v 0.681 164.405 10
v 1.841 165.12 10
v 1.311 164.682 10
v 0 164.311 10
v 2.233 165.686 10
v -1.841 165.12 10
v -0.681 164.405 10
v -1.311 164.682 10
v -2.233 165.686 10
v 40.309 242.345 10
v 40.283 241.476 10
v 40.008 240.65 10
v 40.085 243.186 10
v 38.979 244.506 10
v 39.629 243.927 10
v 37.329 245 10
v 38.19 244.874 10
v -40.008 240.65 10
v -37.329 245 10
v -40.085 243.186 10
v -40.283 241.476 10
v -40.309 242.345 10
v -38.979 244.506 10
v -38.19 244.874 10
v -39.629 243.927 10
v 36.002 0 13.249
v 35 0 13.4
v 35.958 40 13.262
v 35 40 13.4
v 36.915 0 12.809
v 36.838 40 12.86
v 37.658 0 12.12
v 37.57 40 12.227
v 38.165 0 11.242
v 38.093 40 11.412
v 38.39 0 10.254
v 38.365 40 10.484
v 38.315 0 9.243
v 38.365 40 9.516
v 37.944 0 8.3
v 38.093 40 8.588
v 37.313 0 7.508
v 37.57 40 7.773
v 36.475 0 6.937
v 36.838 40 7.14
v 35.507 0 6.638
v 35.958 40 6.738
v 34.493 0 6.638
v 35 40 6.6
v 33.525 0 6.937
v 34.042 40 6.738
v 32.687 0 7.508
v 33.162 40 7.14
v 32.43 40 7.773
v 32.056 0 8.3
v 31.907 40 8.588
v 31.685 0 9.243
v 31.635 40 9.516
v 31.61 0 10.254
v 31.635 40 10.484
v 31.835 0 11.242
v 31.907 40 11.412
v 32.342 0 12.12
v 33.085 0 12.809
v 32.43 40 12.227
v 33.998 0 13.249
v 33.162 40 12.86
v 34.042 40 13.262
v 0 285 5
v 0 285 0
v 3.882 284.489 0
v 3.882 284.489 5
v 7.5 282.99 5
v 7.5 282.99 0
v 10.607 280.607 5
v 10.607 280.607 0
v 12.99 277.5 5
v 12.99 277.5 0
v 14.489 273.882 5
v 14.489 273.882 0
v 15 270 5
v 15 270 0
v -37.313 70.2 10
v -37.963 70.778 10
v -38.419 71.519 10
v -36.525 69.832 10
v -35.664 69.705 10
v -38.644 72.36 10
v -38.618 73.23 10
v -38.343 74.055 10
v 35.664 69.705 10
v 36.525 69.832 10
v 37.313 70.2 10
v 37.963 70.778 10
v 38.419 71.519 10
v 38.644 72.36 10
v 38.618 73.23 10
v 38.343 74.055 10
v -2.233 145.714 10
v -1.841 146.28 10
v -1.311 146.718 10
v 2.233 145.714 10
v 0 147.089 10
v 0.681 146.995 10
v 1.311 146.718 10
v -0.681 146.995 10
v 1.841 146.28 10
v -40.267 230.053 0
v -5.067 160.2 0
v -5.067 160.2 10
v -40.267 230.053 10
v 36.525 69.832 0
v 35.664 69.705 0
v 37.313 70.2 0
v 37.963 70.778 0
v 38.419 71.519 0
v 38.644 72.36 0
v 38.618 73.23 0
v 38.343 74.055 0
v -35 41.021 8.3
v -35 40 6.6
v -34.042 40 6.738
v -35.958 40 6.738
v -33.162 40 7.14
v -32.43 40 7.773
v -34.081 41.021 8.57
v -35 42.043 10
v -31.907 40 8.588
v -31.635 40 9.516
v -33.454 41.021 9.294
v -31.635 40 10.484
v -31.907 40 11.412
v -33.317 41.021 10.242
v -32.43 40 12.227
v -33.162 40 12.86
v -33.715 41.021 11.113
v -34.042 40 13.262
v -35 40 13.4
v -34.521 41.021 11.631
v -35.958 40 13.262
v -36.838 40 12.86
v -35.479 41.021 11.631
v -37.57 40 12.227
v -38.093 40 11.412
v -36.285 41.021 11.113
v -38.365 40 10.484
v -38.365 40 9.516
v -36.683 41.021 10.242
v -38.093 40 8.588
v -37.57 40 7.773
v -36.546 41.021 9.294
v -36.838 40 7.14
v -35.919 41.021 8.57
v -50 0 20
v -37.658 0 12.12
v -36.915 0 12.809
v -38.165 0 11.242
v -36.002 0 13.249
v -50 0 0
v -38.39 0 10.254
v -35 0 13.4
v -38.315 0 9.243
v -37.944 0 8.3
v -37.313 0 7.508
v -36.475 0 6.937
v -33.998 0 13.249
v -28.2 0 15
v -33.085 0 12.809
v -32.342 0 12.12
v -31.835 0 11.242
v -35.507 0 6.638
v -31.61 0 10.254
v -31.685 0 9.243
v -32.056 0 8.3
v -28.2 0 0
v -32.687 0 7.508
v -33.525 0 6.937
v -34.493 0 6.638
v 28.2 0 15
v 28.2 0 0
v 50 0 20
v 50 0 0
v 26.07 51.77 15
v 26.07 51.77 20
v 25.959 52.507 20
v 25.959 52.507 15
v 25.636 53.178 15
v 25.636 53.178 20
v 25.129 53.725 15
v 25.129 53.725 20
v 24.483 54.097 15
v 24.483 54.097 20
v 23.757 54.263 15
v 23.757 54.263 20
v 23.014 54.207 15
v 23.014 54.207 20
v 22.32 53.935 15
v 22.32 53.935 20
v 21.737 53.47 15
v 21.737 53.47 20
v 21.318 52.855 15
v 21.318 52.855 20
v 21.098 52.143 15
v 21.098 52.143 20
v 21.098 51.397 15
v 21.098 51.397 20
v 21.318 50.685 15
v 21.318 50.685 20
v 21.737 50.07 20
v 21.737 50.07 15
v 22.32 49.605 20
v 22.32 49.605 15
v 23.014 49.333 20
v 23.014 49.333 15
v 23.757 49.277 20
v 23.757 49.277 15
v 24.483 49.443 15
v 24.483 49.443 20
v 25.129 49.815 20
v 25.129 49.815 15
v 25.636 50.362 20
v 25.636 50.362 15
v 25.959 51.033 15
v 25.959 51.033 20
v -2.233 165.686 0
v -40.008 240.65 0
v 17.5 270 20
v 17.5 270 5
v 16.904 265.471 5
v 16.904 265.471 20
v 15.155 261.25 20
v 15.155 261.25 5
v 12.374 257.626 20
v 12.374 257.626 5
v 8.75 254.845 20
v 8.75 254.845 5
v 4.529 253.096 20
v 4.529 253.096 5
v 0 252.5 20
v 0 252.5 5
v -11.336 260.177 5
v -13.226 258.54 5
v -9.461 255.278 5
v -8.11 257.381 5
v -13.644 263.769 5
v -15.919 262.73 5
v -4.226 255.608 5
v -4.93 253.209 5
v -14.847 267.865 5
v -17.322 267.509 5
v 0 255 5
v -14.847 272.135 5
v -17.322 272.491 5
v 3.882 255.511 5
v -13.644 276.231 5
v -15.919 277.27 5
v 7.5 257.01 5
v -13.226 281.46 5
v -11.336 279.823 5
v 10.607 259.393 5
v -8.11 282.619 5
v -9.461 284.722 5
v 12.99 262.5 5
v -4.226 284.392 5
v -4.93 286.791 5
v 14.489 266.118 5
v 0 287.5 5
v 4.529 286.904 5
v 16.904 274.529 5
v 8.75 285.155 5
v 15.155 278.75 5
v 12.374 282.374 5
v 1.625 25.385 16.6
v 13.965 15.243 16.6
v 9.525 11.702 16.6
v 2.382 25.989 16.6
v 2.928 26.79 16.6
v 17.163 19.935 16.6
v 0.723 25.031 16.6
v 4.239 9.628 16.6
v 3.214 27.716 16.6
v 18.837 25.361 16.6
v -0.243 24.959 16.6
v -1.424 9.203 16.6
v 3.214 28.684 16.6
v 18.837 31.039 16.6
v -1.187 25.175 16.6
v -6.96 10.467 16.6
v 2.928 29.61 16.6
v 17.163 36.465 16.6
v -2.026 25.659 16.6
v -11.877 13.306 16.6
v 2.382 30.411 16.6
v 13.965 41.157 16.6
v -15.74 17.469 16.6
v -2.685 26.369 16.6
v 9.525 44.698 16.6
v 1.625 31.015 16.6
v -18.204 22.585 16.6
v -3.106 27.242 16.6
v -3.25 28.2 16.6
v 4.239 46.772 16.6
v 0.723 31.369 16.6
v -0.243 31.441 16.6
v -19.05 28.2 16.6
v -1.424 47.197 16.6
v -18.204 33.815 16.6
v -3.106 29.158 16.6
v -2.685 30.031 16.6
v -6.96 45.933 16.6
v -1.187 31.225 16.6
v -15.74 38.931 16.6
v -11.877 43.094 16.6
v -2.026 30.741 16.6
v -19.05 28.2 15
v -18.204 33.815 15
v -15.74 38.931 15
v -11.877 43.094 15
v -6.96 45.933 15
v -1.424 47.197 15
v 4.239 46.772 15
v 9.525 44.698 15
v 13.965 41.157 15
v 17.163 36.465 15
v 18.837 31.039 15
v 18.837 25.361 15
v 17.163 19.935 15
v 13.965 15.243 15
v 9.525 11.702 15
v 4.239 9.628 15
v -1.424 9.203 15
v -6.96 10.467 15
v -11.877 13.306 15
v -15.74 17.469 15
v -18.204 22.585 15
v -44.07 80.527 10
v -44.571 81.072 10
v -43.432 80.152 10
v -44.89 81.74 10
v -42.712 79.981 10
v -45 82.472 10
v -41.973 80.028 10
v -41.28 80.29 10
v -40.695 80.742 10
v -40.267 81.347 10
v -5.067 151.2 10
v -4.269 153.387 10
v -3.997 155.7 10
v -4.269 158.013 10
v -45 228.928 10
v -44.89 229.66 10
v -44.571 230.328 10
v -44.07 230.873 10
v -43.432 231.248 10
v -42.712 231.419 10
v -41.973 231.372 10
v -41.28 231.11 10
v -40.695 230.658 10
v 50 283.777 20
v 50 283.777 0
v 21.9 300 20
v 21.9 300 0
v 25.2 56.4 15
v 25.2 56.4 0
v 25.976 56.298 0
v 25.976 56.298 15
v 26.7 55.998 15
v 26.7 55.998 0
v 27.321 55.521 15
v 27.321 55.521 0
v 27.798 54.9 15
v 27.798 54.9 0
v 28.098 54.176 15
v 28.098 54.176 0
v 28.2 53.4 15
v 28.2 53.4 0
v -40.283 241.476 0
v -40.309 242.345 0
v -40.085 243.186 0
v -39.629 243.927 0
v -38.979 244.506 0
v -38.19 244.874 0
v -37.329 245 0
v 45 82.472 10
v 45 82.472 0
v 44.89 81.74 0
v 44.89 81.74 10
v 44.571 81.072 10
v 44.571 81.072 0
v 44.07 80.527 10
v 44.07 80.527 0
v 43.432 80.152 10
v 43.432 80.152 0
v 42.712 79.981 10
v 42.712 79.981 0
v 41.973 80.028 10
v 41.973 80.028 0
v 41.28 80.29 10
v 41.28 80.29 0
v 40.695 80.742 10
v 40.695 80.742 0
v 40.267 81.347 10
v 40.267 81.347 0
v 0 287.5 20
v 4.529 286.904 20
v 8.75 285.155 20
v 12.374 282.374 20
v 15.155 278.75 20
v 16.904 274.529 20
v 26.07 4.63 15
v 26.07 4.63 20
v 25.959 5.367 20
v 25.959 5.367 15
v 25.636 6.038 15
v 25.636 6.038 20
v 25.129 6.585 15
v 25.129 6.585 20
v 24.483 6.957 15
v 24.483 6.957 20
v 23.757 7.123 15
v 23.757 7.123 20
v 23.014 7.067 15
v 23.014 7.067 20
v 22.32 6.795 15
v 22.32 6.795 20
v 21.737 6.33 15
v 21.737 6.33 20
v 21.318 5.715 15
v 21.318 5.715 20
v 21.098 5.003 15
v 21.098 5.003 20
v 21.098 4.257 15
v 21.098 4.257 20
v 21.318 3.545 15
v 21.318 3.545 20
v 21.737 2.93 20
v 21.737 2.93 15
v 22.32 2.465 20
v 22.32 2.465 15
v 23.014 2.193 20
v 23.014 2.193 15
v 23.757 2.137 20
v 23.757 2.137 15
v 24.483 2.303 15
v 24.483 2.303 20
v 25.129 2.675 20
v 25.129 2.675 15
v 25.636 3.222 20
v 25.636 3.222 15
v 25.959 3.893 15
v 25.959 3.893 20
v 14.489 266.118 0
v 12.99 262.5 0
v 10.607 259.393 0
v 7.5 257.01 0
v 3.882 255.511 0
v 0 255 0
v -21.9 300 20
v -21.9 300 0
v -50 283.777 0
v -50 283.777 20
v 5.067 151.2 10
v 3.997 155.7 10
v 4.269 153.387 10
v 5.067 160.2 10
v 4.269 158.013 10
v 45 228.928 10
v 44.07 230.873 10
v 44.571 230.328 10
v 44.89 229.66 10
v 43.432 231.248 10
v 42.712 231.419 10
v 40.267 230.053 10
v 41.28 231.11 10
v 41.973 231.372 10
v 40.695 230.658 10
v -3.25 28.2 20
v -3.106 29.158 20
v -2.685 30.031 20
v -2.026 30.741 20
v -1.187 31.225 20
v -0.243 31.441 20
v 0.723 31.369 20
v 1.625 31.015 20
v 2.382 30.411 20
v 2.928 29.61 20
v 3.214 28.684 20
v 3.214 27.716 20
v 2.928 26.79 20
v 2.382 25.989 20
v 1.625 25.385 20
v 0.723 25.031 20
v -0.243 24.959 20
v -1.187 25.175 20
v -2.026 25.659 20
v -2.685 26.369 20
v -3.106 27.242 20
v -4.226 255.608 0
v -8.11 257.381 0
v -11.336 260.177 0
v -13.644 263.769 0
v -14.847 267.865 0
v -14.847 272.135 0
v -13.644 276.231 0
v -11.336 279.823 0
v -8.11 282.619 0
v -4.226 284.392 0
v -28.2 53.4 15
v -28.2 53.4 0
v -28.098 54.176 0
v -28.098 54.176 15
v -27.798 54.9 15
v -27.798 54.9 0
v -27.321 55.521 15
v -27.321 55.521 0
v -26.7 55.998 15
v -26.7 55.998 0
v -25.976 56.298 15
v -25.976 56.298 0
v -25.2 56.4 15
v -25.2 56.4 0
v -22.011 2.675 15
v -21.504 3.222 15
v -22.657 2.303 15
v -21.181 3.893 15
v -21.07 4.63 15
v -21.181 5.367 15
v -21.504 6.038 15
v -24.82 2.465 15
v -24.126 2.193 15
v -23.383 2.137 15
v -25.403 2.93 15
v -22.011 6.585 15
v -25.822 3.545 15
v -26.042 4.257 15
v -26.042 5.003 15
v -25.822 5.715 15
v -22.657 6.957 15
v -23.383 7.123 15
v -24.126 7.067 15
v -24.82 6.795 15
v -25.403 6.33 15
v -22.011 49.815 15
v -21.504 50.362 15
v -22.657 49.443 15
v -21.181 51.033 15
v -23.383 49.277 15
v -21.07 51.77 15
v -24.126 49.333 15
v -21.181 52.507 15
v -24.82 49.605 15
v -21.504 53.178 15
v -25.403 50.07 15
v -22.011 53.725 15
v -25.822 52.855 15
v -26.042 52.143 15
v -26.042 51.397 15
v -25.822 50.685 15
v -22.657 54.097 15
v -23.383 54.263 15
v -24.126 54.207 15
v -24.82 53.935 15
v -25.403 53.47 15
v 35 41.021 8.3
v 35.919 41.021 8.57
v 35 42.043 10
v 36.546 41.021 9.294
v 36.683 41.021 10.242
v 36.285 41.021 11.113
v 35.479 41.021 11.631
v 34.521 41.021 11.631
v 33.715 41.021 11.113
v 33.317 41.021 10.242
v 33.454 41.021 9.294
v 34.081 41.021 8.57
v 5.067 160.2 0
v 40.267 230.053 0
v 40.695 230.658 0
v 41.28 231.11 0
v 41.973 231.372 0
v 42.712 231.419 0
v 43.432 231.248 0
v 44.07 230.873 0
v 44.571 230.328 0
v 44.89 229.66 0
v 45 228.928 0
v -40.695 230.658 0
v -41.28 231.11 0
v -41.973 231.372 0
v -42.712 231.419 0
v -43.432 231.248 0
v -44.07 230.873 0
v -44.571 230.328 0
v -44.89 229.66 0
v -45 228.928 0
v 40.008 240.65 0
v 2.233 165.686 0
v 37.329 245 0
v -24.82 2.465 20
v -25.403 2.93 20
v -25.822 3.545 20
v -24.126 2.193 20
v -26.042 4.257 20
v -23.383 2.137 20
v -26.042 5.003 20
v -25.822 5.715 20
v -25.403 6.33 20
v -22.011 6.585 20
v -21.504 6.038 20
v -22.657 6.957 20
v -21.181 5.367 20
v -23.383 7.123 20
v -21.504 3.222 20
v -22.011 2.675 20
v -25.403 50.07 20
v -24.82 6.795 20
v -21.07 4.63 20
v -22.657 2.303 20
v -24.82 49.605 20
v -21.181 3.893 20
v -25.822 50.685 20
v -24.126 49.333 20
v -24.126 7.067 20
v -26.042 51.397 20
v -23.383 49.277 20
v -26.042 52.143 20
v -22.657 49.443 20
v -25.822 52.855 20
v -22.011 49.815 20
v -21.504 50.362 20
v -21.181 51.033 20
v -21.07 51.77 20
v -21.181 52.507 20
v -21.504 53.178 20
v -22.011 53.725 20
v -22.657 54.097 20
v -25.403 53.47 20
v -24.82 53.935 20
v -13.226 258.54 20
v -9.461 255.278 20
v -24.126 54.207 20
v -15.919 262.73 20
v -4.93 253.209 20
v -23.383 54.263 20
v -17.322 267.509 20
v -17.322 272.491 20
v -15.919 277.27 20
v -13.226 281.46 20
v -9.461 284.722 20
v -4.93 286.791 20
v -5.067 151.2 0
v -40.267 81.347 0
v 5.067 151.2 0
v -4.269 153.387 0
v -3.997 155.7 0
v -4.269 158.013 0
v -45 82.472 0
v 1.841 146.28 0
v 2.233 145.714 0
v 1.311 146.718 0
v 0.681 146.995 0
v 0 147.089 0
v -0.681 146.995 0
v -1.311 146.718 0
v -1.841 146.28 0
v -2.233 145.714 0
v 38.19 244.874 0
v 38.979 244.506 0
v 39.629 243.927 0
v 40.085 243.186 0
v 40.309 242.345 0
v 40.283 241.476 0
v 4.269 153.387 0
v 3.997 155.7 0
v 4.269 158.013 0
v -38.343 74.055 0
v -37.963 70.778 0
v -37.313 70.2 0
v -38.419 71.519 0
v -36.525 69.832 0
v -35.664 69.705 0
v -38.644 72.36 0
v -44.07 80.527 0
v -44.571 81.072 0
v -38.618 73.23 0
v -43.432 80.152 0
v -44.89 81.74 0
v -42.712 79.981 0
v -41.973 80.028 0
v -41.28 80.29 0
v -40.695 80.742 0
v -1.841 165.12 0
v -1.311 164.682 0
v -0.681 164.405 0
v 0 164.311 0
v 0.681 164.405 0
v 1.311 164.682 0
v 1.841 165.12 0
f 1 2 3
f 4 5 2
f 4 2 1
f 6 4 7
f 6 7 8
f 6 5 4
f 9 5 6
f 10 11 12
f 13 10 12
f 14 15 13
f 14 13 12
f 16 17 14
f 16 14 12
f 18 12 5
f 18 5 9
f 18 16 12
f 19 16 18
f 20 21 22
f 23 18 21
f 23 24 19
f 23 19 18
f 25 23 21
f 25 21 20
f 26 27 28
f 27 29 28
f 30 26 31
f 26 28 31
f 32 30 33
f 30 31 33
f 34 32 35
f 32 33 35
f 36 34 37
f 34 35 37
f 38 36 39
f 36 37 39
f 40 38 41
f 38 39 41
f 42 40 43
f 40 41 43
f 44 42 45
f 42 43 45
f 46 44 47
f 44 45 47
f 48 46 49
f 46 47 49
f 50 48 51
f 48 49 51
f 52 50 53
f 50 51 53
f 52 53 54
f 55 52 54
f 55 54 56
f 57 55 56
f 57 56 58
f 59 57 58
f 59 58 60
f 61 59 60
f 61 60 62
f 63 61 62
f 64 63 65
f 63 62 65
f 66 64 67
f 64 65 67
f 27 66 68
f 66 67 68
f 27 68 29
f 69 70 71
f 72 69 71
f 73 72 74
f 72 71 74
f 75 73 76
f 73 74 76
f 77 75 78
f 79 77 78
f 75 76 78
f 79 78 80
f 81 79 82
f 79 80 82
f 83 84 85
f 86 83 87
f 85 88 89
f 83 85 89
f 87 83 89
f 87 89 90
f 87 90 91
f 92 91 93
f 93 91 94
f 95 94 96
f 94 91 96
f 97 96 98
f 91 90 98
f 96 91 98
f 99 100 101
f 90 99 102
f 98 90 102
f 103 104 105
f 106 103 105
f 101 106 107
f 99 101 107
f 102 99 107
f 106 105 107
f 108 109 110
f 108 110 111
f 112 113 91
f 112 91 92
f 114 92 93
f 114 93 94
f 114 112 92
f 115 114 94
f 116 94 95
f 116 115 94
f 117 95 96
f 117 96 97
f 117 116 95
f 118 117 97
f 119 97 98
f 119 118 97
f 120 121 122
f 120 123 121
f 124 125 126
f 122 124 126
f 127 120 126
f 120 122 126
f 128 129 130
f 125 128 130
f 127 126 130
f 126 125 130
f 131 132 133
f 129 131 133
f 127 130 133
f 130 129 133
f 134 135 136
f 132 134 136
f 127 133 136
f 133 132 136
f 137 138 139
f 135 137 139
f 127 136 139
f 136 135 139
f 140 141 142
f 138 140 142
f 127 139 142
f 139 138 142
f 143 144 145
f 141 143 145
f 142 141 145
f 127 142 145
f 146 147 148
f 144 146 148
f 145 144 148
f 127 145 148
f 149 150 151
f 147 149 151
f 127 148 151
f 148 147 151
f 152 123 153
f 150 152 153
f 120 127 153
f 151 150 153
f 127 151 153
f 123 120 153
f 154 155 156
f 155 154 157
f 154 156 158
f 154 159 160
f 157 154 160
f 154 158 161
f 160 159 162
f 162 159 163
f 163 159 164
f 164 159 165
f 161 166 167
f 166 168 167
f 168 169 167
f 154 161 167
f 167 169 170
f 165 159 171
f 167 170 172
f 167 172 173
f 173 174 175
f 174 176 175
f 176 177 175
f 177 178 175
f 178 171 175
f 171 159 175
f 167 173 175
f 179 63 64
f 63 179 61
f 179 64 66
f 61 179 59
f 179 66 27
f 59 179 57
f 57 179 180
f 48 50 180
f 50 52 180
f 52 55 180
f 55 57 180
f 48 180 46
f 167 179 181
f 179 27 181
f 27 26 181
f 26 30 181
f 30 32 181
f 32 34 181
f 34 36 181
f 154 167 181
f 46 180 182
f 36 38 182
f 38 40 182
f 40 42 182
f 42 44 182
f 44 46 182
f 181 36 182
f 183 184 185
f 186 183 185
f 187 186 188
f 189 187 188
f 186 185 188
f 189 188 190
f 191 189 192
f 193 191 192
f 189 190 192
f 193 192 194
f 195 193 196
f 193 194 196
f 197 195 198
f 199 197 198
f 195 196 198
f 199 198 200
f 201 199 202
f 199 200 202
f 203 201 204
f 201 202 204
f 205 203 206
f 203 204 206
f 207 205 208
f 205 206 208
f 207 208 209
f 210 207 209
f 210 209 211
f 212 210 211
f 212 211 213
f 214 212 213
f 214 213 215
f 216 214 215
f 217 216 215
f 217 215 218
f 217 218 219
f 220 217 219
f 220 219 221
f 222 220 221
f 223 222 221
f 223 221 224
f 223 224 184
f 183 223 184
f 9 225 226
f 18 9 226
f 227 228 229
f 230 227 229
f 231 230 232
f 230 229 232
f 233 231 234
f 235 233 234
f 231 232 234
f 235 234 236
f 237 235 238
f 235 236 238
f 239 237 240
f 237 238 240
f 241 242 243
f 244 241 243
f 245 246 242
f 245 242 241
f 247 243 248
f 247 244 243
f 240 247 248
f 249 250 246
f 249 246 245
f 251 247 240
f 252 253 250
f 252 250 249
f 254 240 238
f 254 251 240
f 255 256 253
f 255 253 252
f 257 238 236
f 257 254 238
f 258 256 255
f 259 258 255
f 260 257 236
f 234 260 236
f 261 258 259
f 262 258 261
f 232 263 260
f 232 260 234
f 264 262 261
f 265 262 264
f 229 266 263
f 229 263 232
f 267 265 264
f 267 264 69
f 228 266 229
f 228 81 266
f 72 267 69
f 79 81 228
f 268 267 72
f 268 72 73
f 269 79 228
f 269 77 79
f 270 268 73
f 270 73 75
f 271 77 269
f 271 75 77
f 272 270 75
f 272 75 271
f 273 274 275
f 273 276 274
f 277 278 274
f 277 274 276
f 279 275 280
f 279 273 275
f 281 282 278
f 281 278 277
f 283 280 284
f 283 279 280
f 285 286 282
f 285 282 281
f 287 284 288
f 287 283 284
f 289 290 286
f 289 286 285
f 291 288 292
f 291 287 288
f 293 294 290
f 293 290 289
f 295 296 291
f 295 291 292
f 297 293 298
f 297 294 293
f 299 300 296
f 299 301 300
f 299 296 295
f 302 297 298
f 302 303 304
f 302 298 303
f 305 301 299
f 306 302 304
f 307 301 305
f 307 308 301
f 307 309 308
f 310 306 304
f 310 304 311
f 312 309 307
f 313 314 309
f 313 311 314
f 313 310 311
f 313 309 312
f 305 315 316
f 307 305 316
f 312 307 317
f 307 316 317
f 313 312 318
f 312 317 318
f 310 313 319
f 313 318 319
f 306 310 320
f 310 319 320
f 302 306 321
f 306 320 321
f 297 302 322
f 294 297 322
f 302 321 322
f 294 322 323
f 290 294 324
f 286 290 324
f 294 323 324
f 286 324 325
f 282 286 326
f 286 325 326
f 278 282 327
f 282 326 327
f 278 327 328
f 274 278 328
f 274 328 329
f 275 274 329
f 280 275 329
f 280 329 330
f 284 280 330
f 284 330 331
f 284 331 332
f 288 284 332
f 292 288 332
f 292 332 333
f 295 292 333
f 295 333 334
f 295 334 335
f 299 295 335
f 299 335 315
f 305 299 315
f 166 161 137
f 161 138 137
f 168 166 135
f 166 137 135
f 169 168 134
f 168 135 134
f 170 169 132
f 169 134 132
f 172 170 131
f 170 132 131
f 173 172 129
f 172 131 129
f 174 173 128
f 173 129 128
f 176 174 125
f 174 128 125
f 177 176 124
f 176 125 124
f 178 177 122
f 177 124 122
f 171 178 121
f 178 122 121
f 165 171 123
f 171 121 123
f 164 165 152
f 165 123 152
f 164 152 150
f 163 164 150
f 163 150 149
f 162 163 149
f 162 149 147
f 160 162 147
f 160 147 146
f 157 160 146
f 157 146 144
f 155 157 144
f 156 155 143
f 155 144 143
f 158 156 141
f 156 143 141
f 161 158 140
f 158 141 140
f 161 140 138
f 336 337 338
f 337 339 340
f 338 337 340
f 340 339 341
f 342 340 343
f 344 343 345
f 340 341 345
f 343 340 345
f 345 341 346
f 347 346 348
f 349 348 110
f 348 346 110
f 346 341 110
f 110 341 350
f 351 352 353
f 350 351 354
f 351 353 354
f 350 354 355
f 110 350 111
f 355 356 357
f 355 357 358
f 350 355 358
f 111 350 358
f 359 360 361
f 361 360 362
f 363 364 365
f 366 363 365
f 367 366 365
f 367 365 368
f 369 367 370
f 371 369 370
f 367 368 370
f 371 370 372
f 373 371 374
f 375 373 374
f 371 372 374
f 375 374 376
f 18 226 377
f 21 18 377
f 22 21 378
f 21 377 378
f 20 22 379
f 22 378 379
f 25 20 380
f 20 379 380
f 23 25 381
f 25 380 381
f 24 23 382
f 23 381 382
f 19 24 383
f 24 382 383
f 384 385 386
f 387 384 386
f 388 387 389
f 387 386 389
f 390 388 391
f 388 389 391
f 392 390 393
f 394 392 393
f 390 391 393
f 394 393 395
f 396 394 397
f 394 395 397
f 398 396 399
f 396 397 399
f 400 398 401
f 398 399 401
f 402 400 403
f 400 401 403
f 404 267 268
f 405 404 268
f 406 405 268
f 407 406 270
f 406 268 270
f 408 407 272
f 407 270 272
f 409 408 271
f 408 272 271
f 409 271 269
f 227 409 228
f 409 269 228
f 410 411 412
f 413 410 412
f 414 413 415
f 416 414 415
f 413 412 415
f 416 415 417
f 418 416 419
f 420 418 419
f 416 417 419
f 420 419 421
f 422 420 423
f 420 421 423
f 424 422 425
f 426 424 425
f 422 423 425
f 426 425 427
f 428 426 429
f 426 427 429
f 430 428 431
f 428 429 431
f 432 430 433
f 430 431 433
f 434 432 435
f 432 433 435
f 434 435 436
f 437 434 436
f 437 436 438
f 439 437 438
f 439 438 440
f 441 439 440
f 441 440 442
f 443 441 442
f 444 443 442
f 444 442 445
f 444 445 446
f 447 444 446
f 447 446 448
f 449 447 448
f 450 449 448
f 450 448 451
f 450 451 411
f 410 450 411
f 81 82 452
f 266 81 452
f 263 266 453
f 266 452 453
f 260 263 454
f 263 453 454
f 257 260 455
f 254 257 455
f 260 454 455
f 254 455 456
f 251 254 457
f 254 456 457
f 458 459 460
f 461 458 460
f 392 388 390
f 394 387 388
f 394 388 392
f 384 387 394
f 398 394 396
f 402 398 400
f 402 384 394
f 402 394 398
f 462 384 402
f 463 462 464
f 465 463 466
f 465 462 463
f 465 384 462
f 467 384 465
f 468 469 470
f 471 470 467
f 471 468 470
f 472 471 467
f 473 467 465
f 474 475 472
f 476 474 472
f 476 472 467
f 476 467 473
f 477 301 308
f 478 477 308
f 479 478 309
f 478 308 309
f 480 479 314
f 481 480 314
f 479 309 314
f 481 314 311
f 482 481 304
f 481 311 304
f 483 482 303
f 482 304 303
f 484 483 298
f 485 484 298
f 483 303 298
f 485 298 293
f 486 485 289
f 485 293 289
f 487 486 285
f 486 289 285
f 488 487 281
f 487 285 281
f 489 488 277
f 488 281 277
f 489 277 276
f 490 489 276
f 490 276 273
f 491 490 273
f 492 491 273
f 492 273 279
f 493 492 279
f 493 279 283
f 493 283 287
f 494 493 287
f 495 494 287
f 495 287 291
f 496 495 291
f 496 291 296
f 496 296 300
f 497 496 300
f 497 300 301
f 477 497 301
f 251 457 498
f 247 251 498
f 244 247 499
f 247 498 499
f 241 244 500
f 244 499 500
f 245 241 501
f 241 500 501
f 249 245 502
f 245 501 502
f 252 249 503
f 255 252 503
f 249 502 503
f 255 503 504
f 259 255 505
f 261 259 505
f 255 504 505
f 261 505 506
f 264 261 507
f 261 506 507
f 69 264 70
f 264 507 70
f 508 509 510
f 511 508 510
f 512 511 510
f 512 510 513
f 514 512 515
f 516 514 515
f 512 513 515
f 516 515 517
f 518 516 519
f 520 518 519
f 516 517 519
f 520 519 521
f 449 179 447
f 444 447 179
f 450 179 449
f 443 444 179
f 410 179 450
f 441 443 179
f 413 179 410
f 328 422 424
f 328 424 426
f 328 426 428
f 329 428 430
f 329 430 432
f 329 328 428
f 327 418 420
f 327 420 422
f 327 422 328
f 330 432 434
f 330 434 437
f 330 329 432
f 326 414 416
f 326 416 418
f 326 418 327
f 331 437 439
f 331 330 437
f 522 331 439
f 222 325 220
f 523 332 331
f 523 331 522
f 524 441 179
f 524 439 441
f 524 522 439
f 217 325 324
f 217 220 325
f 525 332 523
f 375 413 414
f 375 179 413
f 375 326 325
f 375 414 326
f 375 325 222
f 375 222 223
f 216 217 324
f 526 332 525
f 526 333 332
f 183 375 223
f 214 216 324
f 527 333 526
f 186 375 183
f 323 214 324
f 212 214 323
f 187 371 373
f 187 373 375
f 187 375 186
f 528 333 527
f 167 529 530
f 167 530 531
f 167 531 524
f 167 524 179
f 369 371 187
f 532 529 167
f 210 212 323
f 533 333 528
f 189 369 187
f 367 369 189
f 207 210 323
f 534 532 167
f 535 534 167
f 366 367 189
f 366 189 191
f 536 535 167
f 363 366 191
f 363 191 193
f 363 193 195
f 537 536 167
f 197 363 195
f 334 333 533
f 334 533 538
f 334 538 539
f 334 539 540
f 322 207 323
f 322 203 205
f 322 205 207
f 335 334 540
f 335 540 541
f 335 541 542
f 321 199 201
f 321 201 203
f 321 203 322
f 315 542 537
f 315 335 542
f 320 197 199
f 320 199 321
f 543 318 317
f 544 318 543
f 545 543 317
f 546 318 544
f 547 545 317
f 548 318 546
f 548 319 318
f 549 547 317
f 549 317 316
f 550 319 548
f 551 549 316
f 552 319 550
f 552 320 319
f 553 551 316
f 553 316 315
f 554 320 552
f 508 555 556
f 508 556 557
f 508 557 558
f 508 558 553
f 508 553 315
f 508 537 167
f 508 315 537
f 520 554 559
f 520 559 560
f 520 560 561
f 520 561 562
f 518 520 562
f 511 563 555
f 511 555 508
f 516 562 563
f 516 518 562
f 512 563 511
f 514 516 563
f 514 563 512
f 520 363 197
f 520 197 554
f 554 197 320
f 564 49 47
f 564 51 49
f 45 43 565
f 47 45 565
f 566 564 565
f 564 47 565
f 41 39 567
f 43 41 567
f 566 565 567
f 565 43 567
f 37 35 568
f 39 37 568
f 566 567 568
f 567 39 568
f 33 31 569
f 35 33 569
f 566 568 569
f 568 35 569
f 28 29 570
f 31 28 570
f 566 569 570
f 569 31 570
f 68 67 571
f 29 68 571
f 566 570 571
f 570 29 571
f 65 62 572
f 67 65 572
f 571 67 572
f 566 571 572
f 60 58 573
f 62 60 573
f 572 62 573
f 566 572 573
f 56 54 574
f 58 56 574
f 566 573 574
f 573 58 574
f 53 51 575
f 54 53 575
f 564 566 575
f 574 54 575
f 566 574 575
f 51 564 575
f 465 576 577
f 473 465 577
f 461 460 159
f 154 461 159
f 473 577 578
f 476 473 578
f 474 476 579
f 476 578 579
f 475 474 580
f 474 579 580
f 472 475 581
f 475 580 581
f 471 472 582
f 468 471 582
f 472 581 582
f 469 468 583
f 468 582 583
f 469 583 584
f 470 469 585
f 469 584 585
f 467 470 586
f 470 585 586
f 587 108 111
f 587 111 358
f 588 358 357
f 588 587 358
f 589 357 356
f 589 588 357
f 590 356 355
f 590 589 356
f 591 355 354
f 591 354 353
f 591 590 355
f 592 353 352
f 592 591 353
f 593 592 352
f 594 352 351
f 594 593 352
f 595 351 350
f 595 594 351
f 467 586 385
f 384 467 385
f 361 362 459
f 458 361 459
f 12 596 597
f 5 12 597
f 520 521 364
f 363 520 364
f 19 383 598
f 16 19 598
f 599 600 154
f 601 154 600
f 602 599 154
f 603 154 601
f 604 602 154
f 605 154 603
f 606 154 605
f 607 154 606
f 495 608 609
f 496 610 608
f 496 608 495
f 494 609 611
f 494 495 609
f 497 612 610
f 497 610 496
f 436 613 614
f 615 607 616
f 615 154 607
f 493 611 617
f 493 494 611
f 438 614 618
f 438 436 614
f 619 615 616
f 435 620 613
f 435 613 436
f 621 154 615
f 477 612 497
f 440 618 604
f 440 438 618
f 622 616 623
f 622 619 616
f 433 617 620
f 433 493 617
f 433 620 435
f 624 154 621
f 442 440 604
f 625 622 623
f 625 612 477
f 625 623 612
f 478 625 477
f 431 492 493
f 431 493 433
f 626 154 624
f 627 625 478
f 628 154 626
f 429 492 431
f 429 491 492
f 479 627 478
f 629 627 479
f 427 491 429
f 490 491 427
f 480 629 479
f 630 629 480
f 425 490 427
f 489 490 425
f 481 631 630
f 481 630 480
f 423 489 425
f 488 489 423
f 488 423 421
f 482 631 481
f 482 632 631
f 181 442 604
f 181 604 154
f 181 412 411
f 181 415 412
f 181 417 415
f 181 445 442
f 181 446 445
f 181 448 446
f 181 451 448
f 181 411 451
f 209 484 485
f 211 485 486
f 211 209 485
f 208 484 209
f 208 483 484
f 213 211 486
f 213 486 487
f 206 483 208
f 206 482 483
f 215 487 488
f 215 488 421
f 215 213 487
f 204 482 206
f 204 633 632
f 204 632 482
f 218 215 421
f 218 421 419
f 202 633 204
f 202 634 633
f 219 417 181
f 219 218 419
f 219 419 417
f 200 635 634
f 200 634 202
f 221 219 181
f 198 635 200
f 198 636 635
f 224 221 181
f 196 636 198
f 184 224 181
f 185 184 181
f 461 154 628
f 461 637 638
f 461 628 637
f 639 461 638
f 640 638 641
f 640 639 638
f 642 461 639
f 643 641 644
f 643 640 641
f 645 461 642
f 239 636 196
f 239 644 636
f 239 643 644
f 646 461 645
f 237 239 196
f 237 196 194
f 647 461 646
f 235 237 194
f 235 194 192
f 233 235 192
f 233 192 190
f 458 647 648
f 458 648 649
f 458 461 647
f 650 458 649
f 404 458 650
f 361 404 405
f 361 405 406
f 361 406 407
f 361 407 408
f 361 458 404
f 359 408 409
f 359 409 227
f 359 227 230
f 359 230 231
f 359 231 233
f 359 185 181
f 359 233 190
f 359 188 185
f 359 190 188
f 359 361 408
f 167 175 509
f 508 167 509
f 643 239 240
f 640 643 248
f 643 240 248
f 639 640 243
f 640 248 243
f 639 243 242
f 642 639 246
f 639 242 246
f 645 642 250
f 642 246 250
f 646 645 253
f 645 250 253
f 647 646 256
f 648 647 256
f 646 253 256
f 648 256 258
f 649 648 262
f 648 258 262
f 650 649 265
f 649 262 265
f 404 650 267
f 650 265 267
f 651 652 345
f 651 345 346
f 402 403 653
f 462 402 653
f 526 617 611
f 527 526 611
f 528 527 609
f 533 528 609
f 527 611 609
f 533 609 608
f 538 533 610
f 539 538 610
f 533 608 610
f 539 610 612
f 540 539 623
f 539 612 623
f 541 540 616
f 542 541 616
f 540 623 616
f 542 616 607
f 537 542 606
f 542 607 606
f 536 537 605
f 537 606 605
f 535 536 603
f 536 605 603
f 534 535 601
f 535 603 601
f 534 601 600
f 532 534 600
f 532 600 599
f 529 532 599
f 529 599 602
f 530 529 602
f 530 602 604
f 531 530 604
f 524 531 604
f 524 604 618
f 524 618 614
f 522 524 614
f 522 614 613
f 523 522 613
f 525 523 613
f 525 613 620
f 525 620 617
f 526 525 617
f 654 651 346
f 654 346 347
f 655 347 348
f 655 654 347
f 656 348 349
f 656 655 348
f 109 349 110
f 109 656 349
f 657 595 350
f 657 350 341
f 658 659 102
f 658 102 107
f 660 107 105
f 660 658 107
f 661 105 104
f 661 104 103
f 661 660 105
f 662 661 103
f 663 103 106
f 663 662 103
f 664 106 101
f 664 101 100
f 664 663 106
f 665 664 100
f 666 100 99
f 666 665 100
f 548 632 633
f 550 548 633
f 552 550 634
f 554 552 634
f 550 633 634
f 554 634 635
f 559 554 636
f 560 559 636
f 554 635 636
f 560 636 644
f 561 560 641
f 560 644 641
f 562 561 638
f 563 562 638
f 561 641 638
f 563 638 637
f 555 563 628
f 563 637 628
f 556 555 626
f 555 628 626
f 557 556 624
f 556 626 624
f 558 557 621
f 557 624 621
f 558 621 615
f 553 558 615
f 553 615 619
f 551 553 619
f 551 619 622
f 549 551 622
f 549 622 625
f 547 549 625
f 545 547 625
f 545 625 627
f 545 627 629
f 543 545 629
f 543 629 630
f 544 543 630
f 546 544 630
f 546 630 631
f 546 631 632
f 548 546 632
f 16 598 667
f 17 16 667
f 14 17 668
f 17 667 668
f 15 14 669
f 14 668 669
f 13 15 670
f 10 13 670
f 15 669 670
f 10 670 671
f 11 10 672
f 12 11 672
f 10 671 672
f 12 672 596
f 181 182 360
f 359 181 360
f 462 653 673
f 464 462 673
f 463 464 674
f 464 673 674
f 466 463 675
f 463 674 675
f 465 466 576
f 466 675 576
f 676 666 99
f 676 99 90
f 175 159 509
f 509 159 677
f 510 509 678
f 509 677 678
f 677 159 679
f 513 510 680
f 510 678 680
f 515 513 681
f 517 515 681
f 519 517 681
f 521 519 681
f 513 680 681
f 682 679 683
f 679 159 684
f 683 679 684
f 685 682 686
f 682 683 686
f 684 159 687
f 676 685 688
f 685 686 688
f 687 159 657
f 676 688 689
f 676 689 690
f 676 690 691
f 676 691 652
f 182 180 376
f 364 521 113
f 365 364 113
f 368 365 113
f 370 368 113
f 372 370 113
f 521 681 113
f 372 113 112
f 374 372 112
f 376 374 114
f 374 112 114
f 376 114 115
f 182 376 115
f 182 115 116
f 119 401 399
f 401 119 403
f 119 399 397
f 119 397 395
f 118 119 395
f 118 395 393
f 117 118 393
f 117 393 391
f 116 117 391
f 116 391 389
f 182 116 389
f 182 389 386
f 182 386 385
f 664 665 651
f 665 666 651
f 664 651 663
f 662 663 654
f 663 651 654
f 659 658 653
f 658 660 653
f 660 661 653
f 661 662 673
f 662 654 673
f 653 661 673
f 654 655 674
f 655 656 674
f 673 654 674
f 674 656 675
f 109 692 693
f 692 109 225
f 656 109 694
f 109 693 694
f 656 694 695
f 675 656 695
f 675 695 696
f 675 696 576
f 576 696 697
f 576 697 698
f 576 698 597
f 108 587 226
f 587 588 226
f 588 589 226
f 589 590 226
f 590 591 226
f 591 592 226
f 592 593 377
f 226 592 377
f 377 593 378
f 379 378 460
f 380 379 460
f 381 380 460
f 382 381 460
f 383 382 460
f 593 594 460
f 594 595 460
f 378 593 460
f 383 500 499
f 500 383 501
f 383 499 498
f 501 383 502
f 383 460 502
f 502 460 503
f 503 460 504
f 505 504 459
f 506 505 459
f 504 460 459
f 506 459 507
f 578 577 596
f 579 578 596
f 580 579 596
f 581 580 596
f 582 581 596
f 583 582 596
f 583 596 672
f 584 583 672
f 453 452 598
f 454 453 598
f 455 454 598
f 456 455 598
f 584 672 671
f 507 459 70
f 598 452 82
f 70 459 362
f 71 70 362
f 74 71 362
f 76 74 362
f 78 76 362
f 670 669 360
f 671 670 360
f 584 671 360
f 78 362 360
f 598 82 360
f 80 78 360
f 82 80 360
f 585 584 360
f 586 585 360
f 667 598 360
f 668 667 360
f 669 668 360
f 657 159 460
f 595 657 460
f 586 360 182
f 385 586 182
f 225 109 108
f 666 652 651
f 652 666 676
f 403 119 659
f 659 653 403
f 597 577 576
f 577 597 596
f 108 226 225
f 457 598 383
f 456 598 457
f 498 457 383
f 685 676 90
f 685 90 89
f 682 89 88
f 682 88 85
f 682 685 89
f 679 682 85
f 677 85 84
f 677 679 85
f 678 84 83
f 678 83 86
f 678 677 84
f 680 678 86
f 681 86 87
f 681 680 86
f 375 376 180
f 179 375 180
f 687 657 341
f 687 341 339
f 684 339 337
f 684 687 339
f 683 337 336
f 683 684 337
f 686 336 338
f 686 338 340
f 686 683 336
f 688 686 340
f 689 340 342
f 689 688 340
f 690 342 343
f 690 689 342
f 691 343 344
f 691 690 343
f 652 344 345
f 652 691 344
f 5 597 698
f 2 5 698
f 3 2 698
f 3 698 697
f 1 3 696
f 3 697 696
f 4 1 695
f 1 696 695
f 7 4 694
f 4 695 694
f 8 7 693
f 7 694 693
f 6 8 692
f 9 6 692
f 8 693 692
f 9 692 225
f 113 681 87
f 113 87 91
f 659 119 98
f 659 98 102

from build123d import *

# Parameters (mm, degrees)
SZKIC1_R                    = 17.5
DODANIE_WYCI_GNI_CIE1_DEPTH = 20
SZKIC1_3_R                  = 17.5
SZKIC1_3_R_2                = 15
DODANIE_WYCI_GNI_CIE2_DEPTH = 5
OTW_R_GWINTOWANY_M81_D      = 6.8
OTW_R_GWINTOWANY_M81_DEPTH  = 40
OTW_R_GWINTOWANY_M81_TIP    = 2.042926105
SZKIC4_R                    = 3.25
WYTNIJ_WYCI_GNI_CIE2_DEPTH  = 15
SZKIC4_4_R                  = 19.05
SZKIC4_4_R_2                = 3.25
WYTNIJ_WYCI_GNI_CIE3_DEPTH  = 16.6
SZKIC4_5_R                  = 3.25
WYTNIJ_WYCI_GNI_CIE4_DEPTH  = 49.6
WYTNIJ_WYCI_GNI_CIE6_DEPTH  = 10
OTW_R_GWINTOWANY_M61_D      = 5


with BuildPart() as part:
    # Szkic1 → Dodanie-wyciągnięcie1 (new body)
    with BuildSketch(Plane.XY):
        Polygon((-50, 0), (50, 0), (50, 283.776622614), (21.900286098, 300), (-21.900286098, 300), (-50, 283.776622614), align=None)
        with Locations((0, 270)):
            Circle(SZKIC1_R, mode=Mode.SUBTRACT)
    extrude(amount=DODANIE_WYCI_GNI_CIE1_DEPTH)

    # Szkic1<3> → Dodanie-wyciągnięcie2 (add)
    with BuildSketch(Plane.XY):
        with Locations((0, 270)):
            Circle(SZKIC1_3_R)
        with Locations((0, 270)):
            Circle(SZKIC1_3_R_2, mode=Mode.SUBTRACT)
    extrude(amount=DODANIE_WYCI_GNI_CIE2_DEPTH)

    # Otwór gwintowany M81
    with Locations(Plane(origin=(-35, 0, 10), x_dir=(0, 0, -1), z_dir=(0, -1, 0))):
        with Locations((0, 0), (0, 70)):
            Hole(OTW_R_GWINTOWANY_M81_D / 2, depth=OTW_R_GWINTOWANY_M81_DEPTH)
            with Locations((0, 0, -(OTW_R_GWINTOWANY_M81_DEPTH + OTW_R_GWINTOWANY_M81_TIP / 2))):  # 118° drill point
                Cone(0, OTW_R_GWINTOWANY_M81_D / 2, OTW_R_GWINTOWANY_M81_TIP, mode=Mode.SUBTRACT)

    # Szkic4 → Wytnij-wyciągnięcie2 (cut)
    with BuildSketch(Plane(origin=(0, 0, 0), x_dir=(-1, 0, 0), z_dir=(0, 0, -1))):
        with BuildLine():
            Line((-28.2, 53.4), (-28.2, 0))
            Line((-28.2, 0), (28.2, 0))
            Line((28.2, 0), (28.2, 53.4))
            ThreePointArc((28.2, 53.4), (27.321320344, 55.521320344), (25.2, 56.4))
            Line((25.2, 56.4), (-25.2, 56.4))
            ThreePointArc((-25.2, 56.4), (-27.321320344, 55.521320344), (-28.2, 53.4))
        make_face()
        with Locations((0, 28.2)):
            Circle(SZKIC4_R, mode=Mode.SUBTRACT)
    extrude(amount=-WYTNIJ_WYCI_GNI_CIE2_DEPTH, mode=Mode.SUBTRACT)

    # Szkic4<4> → Wytnij-wyciągnięcie3 (cut)
    with BuildSketch(Plane(origin=(0, 0, 0), x_dir=(-1, 0, 0), z_dir=(0, 0, -1))):
        with Locations((0, 28.2)):
            Circle(SZKIC4_4_R)
        with Locations((0, 28.2)):
            Circle(SZKIC4_4_R_2, mode=Mode.SUBTRACT)
    extrude(amount=-WYTNIJ_WYCI_GNI_CIE3_DEPTH, mode=Mode.SUBTRACT)

    # Szkic4<5> → Wytnij-wyciągnięcie4 (cut)
    with BuildSketch(Plane(origin=(0, 0, 0), x_dir=(-1, 0, 0), z_dir=(0, 0, -1))):
        with Locations((0, 28.2)):
            Circle(SZKIC4_5_R)
    extrude(amount=-WYTNIJ_WYCI_GNI_CIE4_DEPTH, mode=Mode.SUBTRACT)

    # Szkic6 → Wytnij-wyciągnięcie6 (cut)
    with BuildSketch(Plane(origin=(0, 0, 0), x_dir=(-1, 0, 0), z_dir=(0, 0, -1))):
        with BuildLine():
            Line((-45, 228.928061115), (-45, 82.471938885))
            ThreePointArc((-45, 82.471938885), (-43.078190139, 80.039718467), (-40.267443069, 81.346910197))
            Line((-40.267443069, 81.346910197), (-5.067175687, 151.199885246))
            ThreePointArc((-5.067175687, 151.199885246), (-3.997403411, 155.7), (-5.067175687, 160.200114754))
            Line((-5.067175687, 160.200114754), (-40.267443069, 230.053089803))
            ThreePointArc((-40.267443069, 230.053089803), (-43.078190139, 231.360281533), (-45, 228.928061115))
        make_face()
        with BuildLine():
            Line((2.232556931, 145.714200914), (38.342819518, 74.055390936))
            ThreePointArc((38.342819518, 74.055390936), (38.218169264, 71.13215965), (35.663751201, 69.70535651))
            Line((35.663751201, 69.70535651), (-35.663751201, 69.70535651))
            ThreePointArc((-35.663751201, 69.70535651), (-38.218169264, 71.13215965), (-38.342819518, 74.055390936))
            Line((-38.342819518, 74.055390936), (-2.232556931, 145.714200914))
            ThreePointArc((-2.232556931, 145.714200914), (0, 147.089172226), (2.232556931, 145.714200914))
        make_face()
        with BuildLine():
            Line((45, 228.928061115), (45, 82.471938885))
            ThreePointArc((45, 82.471938885), (43.078190139, 80.039718467), (40.267443069, 81.346910197))
            Line((40.267443069, 81.346910197), (5.067175687, 151.199885246))
            ThreePointArc((5.067175687, 151.199885246), (3.997403411, 155.7), (5.067175687, 160.200114754))
            Line((5.067175687, 160.200114754), (40.267443069, 230.053089803))
            ThreePointArc((40.267443069, 230.053089803), (43.078190139, 231.360281533), (45, 228.928061115))
        make_face()
        with BuildLine():
            Line((-40.008452698, 240.649965574), (-2.232556931, 165.685799086))
            ThreePointArc((-2.232556931, 165.685799086), (0, 164.310827774), (2.232556931, 165.685799086))
            Line((2.232556931, 165.685799086), (40.008452698, 240.649965574))
            ThreePointArc((40.008452698, 240.649965574), (39.883802443, 243.57319686), (37.329384381, 245))
            Line((37.329384381, 245), (-37.32938438, 245))
            ThreePointArc((-37.32938438, 245), (-39.883802443, 243.57319686), (-40.008452698, 240.649965574))
        make_face()
    extrude(amount=-WYTNIJ_WYCI_GNI_CIE6_DEPTH, mode=Mode.SUBTRACT)

    # Otwór gwintowany M61 (through all)
    with Locations(Plane(origin=(23.57, 51.77, 15), x_dir=(-1, 0, 0), z_dir=(0, 0, -1))):
        with Locations((0, 0), (47.14, 0), (47.14, -47.14), (0, -47.14)):
            Hole(OTW_R_GWINTOWANY_M61_D / 2)


solid = part.part
